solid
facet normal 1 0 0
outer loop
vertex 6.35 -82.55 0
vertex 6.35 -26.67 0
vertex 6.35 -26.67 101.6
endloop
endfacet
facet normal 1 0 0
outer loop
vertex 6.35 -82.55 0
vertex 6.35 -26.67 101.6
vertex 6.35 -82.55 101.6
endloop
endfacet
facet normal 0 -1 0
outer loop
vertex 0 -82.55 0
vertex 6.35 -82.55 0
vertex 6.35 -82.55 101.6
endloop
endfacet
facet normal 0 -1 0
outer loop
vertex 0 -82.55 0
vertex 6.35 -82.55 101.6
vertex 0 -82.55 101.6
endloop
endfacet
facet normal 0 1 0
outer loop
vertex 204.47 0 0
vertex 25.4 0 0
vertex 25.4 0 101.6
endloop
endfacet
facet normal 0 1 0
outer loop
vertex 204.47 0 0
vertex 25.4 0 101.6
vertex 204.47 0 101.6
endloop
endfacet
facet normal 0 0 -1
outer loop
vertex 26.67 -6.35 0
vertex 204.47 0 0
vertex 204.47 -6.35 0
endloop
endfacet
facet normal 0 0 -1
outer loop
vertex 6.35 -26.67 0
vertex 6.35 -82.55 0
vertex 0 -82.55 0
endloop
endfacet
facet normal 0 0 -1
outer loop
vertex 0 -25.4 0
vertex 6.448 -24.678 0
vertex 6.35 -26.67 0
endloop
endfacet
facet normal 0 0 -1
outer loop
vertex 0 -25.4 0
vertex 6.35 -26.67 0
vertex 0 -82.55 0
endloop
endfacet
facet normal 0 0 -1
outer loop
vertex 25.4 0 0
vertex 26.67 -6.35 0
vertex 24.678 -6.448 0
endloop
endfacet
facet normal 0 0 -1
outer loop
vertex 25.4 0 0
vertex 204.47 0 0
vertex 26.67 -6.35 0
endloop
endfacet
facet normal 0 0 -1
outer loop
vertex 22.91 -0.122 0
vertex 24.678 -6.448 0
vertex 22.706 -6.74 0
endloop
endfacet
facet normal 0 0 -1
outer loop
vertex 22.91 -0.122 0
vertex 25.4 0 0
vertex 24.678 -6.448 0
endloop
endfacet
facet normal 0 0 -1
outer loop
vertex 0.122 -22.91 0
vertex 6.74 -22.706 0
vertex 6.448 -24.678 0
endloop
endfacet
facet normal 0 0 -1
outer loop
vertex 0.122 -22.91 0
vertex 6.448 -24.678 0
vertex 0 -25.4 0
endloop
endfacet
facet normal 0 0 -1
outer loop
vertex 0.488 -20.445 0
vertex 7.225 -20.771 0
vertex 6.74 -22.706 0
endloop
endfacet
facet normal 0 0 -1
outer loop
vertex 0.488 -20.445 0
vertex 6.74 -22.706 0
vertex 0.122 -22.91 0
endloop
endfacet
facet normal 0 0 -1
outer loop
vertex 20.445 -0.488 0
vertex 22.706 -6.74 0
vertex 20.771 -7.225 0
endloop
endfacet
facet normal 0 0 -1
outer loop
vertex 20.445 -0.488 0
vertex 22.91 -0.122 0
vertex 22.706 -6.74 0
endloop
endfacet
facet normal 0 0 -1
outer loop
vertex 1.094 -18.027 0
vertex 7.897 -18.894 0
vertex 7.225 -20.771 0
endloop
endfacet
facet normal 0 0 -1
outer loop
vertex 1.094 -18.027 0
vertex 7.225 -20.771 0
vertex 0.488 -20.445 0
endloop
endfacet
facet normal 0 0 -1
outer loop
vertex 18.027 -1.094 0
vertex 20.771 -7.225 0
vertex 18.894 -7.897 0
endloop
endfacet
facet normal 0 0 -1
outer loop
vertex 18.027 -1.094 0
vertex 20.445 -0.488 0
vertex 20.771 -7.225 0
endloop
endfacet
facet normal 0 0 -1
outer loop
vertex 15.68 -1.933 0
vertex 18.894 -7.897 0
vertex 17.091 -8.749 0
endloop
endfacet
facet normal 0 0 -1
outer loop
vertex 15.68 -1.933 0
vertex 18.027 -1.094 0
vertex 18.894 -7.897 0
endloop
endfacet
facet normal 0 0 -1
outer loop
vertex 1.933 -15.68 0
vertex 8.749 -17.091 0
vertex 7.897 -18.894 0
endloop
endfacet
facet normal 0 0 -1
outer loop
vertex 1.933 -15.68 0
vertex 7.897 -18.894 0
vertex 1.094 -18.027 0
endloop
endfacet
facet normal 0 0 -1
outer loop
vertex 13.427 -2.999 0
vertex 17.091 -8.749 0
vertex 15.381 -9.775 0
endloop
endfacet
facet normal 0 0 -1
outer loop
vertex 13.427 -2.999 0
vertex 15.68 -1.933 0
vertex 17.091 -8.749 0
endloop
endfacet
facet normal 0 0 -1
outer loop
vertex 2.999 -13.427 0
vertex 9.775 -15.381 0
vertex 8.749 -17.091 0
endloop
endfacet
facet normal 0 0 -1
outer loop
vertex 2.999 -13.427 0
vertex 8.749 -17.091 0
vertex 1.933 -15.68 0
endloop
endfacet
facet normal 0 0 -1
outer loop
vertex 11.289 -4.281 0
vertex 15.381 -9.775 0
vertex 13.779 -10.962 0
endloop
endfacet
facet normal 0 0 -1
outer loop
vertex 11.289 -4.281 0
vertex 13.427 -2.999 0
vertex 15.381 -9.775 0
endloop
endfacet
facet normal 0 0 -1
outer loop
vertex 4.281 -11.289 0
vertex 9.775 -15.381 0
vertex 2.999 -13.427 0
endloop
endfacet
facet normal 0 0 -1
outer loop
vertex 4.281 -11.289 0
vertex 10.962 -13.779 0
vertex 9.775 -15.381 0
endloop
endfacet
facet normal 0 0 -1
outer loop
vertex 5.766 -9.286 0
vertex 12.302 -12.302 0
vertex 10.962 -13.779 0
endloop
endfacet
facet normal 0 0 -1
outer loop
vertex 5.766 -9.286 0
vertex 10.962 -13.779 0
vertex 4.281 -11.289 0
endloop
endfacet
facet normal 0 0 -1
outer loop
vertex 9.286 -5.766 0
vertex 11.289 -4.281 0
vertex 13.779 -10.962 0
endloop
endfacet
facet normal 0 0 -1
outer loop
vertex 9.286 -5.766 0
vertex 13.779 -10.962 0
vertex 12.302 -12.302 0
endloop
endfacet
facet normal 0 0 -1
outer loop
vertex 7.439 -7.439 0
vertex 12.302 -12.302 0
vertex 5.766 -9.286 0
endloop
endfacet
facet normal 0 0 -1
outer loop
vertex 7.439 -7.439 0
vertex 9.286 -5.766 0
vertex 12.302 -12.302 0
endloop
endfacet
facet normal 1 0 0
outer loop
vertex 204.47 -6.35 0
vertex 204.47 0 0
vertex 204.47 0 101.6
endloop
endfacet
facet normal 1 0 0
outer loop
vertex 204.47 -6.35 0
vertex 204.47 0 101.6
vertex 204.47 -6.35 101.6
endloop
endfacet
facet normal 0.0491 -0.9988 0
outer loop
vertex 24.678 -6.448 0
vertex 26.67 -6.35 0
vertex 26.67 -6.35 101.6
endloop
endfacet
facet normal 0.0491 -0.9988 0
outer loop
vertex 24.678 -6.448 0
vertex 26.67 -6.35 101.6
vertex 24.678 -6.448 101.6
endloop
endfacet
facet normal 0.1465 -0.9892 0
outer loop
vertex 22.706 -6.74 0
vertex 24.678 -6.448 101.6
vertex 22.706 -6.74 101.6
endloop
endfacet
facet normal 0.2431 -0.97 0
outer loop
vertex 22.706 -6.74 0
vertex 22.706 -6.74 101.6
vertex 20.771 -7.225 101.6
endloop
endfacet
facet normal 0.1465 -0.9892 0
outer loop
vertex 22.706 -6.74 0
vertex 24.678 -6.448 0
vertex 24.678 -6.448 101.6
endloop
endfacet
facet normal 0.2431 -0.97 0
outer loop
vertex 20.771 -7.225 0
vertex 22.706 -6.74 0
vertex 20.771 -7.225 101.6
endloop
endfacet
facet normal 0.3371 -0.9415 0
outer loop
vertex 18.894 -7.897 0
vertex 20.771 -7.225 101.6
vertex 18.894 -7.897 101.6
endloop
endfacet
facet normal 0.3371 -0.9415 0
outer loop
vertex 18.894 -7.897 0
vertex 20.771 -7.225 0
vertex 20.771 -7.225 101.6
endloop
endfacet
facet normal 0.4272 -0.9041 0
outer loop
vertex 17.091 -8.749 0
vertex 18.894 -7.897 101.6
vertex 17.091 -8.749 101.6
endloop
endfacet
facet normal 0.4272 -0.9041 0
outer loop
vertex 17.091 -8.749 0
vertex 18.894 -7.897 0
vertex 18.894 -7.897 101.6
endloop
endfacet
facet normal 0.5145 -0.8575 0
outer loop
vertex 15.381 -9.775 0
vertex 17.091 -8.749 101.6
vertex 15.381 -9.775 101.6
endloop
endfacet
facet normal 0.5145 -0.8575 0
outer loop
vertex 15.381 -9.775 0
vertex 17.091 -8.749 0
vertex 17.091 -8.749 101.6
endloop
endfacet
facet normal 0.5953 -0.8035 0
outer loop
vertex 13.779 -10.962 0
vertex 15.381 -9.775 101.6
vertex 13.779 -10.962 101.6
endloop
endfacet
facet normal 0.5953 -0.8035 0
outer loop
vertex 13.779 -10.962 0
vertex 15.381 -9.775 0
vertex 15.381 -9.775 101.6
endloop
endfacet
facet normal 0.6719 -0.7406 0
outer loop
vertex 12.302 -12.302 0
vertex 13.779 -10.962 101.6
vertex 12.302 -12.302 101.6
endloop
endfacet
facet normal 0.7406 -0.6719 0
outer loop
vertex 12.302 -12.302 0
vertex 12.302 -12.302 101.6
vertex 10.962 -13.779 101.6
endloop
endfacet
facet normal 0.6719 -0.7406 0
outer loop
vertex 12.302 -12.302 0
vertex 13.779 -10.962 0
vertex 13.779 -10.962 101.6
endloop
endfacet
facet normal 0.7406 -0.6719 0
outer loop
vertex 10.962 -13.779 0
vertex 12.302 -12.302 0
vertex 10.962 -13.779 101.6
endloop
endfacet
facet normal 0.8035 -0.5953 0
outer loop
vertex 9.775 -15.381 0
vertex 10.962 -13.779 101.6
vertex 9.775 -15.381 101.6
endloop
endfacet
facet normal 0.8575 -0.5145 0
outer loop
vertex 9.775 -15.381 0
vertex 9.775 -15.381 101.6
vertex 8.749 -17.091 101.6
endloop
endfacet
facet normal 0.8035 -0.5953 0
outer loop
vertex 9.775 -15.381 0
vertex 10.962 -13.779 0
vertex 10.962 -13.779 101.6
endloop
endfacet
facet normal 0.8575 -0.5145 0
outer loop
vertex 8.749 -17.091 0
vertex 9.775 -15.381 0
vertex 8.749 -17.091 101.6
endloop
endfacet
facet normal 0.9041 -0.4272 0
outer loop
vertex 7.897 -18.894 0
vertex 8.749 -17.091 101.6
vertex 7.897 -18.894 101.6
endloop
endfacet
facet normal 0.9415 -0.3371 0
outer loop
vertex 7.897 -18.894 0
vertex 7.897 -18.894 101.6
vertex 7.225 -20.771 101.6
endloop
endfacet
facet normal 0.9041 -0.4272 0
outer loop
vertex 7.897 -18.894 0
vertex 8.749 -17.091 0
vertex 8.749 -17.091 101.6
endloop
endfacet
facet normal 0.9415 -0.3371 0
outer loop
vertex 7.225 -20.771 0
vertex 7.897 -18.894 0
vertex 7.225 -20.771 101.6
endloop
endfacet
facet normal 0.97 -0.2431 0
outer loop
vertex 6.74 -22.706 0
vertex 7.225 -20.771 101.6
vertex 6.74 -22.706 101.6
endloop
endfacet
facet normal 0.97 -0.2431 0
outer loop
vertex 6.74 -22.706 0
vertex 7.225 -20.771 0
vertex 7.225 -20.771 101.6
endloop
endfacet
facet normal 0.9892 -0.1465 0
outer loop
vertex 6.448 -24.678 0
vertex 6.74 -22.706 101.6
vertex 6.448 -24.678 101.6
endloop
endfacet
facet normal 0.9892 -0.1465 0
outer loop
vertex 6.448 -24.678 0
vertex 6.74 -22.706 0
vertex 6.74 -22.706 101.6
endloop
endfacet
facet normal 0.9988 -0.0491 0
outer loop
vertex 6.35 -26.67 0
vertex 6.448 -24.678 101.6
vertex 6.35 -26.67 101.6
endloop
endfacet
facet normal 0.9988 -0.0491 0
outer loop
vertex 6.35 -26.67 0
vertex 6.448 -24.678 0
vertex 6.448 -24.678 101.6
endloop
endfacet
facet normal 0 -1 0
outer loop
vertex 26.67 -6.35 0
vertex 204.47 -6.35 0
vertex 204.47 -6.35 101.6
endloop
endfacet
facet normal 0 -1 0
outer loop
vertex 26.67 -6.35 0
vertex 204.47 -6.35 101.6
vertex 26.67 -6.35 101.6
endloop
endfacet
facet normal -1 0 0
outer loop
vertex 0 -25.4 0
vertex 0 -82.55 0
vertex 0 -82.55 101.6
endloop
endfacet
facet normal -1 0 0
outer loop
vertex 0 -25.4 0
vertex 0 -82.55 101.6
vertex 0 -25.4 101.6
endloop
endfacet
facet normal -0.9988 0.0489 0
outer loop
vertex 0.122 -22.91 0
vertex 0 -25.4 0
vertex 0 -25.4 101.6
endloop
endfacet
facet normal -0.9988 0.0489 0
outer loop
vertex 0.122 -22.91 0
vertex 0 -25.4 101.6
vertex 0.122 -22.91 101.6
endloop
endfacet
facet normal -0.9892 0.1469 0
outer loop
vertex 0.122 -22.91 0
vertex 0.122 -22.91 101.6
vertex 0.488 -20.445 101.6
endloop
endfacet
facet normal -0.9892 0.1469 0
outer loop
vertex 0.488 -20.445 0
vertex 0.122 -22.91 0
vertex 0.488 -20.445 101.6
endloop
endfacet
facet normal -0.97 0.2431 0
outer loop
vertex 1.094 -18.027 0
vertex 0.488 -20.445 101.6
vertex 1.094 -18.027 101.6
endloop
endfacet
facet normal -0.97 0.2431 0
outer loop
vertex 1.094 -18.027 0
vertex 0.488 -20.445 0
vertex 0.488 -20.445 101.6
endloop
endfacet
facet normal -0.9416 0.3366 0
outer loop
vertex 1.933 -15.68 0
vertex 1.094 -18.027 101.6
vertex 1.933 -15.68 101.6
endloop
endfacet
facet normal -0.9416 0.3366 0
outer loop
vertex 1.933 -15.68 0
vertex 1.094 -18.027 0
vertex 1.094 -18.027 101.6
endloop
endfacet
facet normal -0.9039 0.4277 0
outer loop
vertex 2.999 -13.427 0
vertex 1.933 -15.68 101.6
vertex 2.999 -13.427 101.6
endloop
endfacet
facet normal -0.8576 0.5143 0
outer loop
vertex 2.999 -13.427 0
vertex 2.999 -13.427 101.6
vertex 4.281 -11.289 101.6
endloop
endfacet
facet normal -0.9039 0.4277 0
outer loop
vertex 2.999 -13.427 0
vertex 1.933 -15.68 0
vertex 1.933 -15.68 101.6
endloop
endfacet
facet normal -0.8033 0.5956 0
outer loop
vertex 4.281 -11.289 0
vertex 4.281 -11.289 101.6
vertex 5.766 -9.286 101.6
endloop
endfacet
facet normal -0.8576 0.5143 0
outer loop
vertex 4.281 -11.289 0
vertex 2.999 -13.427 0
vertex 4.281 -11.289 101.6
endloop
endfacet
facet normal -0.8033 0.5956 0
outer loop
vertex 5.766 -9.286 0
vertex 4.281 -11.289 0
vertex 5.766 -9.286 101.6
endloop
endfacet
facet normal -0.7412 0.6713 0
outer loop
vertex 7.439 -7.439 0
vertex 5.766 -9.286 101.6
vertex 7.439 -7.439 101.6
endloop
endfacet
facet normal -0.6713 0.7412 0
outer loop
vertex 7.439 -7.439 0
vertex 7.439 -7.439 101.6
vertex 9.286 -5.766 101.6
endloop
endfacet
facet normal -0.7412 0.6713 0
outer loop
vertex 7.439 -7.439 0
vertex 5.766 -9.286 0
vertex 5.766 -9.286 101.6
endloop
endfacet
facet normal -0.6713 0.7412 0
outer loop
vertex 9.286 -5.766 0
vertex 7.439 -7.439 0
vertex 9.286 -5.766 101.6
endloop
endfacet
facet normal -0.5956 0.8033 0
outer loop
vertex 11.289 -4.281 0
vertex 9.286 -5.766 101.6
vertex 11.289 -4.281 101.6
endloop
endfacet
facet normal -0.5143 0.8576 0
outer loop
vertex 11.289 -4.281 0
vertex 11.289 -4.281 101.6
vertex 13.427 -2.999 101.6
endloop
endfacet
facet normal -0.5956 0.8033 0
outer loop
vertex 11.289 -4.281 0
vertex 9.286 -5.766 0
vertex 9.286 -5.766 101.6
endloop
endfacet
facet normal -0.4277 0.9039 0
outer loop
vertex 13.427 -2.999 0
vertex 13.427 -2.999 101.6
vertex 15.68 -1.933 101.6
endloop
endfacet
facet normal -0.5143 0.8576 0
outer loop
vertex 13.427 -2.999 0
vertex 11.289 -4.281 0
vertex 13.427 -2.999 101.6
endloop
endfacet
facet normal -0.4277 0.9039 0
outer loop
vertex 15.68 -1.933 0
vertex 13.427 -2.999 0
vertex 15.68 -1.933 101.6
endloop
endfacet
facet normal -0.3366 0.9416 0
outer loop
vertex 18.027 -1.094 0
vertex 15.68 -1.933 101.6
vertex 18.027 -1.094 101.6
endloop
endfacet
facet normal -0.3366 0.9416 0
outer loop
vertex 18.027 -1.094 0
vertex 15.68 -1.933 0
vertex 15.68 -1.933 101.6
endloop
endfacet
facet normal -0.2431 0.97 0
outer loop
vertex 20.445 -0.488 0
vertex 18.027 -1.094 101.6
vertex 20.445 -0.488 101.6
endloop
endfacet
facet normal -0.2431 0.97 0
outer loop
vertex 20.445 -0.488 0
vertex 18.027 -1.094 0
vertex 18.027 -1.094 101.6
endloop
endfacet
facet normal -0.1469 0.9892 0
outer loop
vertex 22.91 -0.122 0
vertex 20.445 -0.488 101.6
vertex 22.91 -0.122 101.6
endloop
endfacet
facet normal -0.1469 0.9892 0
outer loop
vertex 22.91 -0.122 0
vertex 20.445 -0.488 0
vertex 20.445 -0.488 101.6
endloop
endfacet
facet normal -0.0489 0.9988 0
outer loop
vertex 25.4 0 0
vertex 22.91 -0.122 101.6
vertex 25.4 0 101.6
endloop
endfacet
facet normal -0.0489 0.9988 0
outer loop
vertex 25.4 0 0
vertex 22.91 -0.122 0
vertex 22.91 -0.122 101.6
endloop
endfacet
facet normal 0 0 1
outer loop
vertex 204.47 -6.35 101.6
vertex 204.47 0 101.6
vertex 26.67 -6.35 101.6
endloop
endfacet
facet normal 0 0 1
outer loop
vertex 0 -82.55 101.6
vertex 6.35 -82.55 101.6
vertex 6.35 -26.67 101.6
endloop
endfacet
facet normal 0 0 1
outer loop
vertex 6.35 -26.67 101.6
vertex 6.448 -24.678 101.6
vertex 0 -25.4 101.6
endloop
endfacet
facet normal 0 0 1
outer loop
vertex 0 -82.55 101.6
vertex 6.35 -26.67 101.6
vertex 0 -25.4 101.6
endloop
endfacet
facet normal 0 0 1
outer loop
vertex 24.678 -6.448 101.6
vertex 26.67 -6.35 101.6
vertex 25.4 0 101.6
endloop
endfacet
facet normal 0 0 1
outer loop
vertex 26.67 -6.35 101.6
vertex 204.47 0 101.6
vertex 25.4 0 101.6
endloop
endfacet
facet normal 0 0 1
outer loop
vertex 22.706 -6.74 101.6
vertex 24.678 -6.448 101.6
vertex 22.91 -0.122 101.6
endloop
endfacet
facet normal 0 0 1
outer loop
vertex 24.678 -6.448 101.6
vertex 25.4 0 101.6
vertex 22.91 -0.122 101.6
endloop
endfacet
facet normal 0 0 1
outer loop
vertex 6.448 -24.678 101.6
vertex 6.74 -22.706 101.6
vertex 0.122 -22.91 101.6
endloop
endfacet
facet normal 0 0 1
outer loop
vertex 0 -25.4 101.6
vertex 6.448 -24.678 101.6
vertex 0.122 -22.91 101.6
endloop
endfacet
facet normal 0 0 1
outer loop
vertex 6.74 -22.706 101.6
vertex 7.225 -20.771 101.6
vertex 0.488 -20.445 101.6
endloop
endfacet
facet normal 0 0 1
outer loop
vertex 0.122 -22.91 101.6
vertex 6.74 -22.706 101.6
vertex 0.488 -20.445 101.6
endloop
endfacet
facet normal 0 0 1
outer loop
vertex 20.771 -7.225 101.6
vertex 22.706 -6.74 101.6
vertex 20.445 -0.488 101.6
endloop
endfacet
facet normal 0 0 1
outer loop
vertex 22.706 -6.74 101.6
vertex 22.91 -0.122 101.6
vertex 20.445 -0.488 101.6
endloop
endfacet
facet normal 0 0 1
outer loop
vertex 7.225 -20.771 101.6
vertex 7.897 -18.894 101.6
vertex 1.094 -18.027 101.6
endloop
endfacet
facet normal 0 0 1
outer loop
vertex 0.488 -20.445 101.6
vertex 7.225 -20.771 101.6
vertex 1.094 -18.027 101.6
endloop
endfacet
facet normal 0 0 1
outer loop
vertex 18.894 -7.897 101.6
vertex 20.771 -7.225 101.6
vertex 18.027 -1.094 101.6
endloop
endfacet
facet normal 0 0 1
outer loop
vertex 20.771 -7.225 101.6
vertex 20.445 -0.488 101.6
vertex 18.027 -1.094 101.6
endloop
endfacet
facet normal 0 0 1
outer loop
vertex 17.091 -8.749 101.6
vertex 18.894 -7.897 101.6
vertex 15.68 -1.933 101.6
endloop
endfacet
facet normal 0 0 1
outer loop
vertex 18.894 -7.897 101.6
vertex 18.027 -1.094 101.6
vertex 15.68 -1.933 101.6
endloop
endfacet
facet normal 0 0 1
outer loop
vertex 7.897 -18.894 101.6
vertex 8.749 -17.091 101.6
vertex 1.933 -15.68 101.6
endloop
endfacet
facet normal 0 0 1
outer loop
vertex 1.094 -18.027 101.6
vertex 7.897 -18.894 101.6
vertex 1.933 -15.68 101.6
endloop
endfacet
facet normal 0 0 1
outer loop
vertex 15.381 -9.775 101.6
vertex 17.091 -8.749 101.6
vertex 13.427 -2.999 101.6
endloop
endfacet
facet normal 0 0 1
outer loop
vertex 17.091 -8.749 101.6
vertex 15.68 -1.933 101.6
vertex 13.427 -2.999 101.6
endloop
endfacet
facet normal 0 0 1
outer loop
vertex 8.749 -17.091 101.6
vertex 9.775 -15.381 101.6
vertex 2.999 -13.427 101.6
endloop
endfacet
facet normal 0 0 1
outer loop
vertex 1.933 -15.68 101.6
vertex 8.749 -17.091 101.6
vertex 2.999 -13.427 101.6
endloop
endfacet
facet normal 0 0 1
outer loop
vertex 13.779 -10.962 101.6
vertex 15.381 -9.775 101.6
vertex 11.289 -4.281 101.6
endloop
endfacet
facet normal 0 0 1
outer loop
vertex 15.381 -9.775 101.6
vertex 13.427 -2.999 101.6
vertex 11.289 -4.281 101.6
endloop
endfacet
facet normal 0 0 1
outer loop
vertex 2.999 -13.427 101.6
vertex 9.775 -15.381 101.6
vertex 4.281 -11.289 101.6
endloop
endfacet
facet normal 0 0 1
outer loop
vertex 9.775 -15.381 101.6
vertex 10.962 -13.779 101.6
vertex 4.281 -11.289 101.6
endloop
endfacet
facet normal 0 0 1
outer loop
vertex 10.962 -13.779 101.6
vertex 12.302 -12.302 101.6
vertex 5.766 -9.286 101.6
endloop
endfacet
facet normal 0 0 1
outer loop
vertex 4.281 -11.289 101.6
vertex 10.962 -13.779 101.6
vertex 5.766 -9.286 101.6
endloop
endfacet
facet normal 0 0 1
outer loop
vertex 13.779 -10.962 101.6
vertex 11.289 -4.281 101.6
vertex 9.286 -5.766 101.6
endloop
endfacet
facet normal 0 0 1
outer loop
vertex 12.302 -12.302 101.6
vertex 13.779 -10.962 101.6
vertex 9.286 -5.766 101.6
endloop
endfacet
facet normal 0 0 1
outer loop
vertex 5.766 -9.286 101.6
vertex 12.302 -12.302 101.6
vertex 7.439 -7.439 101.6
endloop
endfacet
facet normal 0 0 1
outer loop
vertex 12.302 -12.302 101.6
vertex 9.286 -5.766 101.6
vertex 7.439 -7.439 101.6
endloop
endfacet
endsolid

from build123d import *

# Parameters (mm, degrees)
BOSS_EXTRUDE1_DEPTH = 101.6


with BuildPart() as part:
    # Sketch1 → Boss-Extrude1 (new body)
    with BuildSketch(Plane.XY):
        with BuildLine():
            Line((25.4, 0), (204.47, 0))
            Line((204.47, 0), (204.47, -6.35))
            Line((204.47, -6.35), (26.67, -6.35))
            ThreePointArc((26.67, -6.35), (12.301590206, -12.301590206), (6.35, -26.67))
            Line((6.35, -26.67), (6.35, -82.55))
            Line((6.35, -82.55), (0, -82.55))
            Line((0, -82.55), (0, -25.4))
            ThreePointArc((0, -25.4), (7.439487758, -7.439487758), (25.4, 0))
        make_face()
    extrude(amount=BOSS_EXTRUDE1_DEPTH)


solid = part.part
